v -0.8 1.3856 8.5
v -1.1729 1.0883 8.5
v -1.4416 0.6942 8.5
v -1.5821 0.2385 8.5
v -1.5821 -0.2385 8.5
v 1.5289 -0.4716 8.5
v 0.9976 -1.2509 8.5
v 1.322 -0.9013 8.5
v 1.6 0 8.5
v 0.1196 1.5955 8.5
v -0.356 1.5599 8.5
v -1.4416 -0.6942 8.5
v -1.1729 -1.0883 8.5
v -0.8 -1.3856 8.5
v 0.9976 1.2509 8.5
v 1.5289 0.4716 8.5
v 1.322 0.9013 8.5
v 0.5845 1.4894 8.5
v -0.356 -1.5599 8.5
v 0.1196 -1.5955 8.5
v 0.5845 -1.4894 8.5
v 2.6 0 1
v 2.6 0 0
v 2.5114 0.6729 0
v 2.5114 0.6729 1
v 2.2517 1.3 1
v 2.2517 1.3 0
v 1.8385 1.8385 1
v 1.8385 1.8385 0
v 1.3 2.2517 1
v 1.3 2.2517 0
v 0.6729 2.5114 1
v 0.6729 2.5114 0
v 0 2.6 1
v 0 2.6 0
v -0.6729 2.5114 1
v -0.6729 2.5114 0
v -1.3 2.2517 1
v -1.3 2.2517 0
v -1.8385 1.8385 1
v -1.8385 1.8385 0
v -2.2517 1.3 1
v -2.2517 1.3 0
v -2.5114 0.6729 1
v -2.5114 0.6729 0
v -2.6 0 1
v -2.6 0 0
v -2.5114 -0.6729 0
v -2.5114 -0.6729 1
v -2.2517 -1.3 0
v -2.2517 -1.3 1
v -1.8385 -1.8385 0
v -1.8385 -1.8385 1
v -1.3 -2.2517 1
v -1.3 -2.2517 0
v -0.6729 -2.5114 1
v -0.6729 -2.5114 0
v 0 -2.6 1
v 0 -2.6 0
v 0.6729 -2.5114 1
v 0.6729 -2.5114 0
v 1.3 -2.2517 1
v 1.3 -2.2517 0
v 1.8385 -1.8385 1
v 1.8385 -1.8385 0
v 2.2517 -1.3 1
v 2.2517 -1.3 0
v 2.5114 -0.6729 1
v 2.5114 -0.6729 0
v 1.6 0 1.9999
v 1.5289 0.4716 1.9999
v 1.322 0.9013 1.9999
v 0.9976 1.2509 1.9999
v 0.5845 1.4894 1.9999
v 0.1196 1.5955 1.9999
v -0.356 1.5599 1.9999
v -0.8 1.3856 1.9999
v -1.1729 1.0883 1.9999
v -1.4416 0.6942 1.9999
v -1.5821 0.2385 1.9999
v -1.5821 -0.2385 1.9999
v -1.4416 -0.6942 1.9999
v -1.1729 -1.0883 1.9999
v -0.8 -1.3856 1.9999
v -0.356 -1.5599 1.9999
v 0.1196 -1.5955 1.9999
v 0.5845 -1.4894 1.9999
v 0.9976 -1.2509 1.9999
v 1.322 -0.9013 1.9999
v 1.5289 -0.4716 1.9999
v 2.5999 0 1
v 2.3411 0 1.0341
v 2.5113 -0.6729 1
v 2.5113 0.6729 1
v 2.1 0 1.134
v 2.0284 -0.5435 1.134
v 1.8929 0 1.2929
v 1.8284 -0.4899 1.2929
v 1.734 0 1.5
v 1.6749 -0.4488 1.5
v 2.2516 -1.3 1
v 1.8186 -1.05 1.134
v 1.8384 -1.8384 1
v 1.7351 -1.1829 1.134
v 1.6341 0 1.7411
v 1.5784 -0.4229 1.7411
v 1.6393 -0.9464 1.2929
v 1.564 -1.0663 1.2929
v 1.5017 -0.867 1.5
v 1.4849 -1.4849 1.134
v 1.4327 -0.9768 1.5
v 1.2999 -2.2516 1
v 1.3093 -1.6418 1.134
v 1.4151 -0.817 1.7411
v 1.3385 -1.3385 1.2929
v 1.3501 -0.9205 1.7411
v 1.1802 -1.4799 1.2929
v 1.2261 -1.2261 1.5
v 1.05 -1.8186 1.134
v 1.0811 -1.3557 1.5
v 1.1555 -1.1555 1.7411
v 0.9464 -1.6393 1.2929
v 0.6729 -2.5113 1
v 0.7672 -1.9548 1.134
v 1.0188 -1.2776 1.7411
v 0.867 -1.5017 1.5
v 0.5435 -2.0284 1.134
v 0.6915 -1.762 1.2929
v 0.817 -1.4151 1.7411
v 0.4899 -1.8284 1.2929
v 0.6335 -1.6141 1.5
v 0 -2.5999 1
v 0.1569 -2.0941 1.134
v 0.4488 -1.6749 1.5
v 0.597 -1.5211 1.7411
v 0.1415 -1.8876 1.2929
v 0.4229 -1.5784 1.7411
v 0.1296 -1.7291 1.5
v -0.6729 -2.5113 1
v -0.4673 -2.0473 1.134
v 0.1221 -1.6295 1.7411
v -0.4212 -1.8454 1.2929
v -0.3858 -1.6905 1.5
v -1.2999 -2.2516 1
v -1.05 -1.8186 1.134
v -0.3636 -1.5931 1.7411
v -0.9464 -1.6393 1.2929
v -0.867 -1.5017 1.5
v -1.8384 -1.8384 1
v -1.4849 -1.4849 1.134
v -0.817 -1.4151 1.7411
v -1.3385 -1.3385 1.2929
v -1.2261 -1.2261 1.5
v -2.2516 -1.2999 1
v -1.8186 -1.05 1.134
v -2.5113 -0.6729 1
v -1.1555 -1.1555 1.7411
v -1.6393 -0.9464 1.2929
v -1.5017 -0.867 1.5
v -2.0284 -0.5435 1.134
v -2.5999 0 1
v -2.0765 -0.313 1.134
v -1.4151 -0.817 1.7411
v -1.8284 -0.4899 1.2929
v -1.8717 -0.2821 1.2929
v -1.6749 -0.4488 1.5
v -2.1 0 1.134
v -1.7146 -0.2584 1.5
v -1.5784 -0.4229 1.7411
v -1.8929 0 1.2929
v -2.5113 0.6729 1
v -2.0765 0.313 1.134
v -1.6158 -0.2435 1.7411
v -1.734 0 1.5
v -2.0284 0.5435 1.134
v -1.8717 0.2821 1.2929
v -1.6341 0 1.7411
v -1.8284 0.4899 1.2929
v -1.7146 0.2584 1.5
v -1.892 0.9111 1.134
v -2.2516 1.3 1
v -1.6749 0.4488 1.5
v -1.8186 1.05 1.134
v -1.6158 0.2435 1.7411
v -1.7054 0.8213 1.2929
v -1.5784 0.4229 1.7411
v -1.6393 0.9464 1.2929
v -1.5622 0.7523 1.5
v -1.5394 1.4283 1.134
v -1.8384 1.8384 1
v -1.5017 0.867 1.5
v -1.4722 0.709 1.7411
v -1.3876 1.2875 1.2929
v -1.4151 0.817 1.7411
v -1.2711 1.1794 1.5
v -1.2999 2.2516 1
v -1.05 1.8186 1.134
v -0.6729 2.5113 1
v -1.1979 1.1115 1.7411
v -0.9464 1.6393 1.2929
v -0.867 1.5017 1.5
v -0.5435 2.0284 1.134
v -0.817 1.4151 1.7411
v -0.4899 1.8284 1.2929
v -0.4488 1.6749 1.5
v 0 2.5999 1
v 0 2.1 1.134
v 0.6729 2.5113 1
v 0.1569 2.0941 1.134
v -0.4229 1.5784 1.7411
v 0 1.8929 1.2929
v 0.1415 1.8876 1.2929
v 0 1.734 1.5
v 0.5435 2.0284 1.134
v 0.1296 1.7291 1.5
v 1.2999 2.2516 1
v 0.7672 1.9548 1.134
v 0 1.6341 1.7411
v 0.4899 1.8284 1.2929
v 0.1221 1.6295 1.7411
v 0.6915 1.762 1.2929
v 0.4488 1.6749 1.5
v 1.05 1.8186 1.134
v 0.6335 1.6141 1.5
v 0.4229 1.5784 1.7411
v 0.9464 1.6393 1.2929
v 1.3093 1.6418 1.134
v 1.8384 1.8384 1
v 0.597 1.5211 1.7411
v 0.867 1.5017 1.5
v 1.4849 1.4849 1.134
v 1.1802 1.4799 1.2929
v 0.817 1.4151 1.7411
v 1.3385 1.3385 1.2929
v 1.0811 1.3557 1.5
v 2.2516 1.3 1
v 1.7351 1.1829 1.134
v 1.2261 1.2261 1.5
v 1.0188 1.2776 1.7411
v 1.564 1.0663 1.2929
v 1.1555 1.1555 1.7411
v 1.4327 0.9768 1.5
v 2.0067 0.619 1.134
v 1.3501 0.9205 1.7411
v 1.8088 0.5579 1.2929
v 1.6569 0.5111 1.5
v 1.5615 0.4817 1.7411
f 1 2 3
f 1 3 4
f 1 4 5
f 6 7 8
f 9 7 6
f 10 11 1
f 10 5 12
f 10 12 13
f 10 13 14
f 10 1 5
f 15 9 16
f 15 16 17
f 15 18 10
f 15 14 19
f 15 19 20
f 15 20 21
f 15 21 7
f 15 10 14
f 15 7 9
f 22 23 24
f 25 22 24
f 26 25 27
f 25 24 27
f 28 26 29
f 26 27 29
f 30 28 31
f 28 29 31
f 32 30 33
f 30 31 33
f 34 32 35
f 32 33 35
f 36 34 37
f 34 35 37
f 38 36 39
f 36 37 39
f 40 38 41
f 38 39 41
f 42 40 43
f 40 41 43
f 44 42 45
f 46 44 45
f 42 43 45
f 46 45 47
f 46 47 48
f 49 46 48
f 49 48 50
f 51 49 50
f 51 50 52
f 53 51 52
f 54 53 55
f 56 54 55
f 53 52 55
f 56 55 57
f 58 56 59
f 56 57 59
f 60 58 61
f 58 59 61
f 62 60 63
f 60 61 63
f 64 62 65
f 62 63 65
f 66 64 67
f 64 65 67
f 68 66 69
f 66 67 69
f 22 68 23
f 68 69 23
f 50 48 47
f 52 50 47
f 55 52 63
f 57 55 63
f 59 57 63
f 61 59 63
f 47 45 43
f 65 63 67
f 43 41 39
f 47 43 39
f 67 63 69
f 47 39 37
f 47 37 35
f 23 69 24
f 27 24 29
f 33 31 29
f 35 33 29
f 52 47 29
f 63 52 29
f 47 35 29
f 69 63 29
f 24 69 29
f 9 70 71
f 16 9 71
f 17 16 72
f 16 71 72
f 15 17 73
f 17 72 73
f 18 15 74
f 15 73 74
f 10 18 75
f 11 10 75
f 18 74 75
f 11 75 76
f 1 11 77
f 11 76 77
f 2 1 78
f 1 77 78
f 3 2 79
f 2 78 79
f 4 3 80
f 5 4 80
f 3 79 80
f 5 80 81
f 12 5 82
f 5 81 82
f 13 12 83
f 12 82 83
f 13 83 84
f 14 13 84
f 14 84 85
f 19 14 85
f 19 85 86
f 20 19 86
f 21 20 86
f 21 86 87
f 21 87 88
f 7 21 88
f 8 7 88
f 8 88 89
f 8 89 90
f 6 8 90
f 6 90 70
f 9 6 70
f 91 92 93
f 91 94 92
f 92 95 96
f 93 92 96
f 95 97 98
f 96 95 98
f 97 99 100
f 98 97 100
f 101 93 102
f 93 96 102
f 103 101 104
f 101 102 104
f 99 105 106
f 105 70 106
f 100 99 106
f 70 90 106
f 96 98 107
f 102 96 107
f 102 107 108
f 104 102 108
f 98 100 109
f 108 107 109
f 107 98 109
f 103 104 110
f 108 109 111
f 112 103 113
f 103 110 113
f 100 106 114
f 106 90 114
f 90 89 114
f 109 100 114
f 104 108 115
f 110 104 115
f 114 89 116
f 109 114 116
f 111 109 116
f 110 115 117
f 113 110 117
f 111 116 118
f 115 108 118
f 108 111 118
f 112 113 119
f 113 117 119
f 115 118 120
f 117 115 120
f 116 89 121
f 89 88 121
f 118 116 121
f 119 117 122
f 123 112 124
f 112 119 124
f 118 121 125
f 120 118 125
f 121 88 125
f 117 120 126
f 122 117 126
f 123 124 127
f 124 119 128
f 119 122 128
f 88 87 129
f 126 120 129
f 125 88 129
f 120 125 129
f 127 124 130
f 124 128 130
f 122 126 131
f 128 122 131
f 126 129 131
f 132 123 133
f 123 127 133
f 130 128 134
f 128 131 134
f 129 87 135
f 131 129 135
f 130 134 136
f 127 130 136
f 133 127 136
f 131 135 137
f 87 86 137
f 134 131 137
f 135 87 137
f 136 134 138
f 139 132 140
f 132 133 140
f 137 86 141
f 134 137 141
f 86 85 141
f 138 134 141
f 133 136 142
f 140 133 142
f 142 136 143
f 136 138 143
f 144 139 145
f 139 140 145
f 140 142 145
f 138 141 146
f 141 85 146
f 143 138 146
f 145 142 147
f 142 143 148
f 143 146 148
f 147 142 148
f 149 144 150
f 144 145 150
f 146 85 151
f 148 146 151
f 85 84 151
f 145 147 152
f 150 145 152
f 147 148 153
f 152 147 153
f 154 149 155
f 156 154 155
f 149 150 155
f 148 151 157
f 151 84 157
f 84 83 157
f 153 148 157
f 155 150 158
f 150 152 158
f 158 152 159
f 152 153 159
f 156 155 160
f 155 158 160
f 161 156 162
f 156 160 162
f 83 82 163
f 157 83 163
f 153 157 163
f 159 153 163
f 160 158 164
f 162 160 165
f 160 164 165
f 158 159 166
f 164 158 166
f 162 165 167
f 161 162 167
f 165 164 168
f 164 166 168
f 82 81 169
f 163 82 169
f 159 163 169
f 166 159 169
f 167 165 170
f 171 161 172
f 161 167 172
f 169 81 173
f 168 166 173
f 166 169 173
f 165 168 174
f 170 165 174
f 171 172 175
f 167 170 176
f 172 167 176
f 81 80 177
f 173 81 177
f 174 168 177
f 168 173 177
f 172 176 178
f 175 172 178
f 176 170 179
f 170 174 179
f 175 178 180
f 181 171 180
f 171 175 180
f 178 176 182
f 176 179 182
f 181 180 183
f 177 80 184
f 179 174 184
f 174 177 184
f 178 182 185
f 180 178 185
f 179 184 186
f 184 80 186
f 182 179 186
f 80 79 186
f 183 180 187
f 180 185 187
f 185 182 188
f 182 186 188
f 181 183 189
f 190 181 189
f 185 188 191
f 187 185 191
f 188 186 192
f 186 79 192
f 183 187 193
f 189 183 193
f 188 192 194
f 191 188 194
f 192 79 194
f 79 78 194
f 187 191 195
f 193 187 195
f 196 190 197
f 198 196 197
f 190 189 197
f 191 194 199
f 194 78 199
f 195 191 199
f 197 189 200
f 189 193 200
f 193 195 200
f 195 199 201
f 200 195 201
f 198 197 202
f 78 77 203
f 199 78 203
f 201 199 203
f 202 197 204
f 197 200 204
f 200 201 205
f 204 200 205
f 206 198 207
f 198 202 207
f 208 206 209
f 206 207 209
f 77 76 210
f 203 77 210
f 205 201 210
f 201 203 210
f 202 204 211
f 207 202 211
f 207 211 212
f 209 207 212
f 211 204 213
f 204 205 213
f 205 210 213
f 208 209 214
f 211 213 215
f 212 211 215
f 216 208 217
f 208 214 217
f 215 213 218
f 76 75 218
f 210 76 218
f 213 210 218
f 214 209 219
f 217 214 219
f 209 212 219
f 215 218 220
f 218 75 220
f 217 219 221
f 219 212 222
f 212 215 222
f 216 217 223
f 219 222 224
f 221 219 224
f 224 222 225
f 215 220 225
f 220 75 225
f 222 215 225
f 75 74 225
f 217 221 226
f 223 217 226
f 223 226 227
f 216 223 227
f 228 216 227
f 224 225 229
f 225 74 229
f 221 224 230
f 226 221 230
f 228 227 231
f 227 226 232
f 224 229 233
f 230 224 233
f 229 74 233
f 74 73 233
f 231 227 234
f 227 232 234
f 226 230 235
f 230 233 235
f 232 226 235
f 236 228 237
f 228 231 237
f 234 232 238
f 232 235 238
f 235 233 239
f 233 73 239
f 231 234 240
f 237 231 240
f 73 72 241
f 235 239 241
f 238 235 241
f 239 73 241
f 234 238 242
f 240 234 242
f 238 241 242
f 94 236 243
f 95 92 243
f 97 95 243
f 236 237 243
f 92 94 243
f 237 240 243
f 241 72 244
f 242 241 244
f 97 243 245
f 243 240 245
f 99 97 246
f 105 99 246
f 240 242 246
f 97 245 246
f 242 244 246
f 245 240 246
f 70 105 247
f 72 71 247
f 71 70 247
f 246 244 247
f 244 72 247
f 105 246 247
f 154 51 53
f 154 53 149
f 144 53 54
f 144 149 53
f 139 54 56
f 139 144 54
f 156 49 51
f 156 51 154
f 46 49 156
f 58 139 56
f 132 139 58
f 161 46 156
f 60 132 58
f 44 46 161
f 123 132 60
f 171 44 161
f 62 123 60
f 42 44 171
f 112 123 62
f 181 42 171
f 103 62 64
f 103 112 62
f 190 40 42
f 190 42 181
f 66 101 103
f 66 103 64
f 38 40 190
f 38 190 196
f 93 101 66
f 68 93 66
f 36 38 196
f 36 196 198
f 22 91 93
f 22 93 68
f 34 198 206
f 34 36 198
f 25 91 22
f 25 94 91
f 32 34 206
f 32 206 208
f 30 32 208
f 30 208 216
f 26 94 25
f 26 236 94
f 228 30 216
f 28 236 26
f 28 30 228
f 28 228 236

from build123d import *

# Parameters (mm, degrees)
SKETCH_1_R      = 1.6
EXTRUDE_1_DEPTH = 8.5
SKETCH_2_R      = 2.6
EXTRUDE_2_DEPTH = 1
FILLET_1_R      = 1


with BuildPart() as part:
    # Эскиз1 → Бобышка-Вытянуть1 (new body)
    with BuildSketch(Plane.XY):
        Circle(SKETCH_1_R)
    extrude(amount=EXTRUDE_1_DEPTH)

    # Эскиз2 → Бобышка-Вытянуть2 (add)
    with BuildSketch(Plane.XY):
        Circle(SKETCH_2_R)
    extrude(amount=EXTRUDE_2_DEPTH)

    # Скругление1
    fillet_1_edges = [part.edges().sort_by_distance(p)[0] for p in [
        (-1.6, 0, 1),
    ]]
    fillet(fillet_1_edges, radius=FILLET_1_R - 0.0001)  # a hair under: the kernel refuses the full size


solid = part.part
